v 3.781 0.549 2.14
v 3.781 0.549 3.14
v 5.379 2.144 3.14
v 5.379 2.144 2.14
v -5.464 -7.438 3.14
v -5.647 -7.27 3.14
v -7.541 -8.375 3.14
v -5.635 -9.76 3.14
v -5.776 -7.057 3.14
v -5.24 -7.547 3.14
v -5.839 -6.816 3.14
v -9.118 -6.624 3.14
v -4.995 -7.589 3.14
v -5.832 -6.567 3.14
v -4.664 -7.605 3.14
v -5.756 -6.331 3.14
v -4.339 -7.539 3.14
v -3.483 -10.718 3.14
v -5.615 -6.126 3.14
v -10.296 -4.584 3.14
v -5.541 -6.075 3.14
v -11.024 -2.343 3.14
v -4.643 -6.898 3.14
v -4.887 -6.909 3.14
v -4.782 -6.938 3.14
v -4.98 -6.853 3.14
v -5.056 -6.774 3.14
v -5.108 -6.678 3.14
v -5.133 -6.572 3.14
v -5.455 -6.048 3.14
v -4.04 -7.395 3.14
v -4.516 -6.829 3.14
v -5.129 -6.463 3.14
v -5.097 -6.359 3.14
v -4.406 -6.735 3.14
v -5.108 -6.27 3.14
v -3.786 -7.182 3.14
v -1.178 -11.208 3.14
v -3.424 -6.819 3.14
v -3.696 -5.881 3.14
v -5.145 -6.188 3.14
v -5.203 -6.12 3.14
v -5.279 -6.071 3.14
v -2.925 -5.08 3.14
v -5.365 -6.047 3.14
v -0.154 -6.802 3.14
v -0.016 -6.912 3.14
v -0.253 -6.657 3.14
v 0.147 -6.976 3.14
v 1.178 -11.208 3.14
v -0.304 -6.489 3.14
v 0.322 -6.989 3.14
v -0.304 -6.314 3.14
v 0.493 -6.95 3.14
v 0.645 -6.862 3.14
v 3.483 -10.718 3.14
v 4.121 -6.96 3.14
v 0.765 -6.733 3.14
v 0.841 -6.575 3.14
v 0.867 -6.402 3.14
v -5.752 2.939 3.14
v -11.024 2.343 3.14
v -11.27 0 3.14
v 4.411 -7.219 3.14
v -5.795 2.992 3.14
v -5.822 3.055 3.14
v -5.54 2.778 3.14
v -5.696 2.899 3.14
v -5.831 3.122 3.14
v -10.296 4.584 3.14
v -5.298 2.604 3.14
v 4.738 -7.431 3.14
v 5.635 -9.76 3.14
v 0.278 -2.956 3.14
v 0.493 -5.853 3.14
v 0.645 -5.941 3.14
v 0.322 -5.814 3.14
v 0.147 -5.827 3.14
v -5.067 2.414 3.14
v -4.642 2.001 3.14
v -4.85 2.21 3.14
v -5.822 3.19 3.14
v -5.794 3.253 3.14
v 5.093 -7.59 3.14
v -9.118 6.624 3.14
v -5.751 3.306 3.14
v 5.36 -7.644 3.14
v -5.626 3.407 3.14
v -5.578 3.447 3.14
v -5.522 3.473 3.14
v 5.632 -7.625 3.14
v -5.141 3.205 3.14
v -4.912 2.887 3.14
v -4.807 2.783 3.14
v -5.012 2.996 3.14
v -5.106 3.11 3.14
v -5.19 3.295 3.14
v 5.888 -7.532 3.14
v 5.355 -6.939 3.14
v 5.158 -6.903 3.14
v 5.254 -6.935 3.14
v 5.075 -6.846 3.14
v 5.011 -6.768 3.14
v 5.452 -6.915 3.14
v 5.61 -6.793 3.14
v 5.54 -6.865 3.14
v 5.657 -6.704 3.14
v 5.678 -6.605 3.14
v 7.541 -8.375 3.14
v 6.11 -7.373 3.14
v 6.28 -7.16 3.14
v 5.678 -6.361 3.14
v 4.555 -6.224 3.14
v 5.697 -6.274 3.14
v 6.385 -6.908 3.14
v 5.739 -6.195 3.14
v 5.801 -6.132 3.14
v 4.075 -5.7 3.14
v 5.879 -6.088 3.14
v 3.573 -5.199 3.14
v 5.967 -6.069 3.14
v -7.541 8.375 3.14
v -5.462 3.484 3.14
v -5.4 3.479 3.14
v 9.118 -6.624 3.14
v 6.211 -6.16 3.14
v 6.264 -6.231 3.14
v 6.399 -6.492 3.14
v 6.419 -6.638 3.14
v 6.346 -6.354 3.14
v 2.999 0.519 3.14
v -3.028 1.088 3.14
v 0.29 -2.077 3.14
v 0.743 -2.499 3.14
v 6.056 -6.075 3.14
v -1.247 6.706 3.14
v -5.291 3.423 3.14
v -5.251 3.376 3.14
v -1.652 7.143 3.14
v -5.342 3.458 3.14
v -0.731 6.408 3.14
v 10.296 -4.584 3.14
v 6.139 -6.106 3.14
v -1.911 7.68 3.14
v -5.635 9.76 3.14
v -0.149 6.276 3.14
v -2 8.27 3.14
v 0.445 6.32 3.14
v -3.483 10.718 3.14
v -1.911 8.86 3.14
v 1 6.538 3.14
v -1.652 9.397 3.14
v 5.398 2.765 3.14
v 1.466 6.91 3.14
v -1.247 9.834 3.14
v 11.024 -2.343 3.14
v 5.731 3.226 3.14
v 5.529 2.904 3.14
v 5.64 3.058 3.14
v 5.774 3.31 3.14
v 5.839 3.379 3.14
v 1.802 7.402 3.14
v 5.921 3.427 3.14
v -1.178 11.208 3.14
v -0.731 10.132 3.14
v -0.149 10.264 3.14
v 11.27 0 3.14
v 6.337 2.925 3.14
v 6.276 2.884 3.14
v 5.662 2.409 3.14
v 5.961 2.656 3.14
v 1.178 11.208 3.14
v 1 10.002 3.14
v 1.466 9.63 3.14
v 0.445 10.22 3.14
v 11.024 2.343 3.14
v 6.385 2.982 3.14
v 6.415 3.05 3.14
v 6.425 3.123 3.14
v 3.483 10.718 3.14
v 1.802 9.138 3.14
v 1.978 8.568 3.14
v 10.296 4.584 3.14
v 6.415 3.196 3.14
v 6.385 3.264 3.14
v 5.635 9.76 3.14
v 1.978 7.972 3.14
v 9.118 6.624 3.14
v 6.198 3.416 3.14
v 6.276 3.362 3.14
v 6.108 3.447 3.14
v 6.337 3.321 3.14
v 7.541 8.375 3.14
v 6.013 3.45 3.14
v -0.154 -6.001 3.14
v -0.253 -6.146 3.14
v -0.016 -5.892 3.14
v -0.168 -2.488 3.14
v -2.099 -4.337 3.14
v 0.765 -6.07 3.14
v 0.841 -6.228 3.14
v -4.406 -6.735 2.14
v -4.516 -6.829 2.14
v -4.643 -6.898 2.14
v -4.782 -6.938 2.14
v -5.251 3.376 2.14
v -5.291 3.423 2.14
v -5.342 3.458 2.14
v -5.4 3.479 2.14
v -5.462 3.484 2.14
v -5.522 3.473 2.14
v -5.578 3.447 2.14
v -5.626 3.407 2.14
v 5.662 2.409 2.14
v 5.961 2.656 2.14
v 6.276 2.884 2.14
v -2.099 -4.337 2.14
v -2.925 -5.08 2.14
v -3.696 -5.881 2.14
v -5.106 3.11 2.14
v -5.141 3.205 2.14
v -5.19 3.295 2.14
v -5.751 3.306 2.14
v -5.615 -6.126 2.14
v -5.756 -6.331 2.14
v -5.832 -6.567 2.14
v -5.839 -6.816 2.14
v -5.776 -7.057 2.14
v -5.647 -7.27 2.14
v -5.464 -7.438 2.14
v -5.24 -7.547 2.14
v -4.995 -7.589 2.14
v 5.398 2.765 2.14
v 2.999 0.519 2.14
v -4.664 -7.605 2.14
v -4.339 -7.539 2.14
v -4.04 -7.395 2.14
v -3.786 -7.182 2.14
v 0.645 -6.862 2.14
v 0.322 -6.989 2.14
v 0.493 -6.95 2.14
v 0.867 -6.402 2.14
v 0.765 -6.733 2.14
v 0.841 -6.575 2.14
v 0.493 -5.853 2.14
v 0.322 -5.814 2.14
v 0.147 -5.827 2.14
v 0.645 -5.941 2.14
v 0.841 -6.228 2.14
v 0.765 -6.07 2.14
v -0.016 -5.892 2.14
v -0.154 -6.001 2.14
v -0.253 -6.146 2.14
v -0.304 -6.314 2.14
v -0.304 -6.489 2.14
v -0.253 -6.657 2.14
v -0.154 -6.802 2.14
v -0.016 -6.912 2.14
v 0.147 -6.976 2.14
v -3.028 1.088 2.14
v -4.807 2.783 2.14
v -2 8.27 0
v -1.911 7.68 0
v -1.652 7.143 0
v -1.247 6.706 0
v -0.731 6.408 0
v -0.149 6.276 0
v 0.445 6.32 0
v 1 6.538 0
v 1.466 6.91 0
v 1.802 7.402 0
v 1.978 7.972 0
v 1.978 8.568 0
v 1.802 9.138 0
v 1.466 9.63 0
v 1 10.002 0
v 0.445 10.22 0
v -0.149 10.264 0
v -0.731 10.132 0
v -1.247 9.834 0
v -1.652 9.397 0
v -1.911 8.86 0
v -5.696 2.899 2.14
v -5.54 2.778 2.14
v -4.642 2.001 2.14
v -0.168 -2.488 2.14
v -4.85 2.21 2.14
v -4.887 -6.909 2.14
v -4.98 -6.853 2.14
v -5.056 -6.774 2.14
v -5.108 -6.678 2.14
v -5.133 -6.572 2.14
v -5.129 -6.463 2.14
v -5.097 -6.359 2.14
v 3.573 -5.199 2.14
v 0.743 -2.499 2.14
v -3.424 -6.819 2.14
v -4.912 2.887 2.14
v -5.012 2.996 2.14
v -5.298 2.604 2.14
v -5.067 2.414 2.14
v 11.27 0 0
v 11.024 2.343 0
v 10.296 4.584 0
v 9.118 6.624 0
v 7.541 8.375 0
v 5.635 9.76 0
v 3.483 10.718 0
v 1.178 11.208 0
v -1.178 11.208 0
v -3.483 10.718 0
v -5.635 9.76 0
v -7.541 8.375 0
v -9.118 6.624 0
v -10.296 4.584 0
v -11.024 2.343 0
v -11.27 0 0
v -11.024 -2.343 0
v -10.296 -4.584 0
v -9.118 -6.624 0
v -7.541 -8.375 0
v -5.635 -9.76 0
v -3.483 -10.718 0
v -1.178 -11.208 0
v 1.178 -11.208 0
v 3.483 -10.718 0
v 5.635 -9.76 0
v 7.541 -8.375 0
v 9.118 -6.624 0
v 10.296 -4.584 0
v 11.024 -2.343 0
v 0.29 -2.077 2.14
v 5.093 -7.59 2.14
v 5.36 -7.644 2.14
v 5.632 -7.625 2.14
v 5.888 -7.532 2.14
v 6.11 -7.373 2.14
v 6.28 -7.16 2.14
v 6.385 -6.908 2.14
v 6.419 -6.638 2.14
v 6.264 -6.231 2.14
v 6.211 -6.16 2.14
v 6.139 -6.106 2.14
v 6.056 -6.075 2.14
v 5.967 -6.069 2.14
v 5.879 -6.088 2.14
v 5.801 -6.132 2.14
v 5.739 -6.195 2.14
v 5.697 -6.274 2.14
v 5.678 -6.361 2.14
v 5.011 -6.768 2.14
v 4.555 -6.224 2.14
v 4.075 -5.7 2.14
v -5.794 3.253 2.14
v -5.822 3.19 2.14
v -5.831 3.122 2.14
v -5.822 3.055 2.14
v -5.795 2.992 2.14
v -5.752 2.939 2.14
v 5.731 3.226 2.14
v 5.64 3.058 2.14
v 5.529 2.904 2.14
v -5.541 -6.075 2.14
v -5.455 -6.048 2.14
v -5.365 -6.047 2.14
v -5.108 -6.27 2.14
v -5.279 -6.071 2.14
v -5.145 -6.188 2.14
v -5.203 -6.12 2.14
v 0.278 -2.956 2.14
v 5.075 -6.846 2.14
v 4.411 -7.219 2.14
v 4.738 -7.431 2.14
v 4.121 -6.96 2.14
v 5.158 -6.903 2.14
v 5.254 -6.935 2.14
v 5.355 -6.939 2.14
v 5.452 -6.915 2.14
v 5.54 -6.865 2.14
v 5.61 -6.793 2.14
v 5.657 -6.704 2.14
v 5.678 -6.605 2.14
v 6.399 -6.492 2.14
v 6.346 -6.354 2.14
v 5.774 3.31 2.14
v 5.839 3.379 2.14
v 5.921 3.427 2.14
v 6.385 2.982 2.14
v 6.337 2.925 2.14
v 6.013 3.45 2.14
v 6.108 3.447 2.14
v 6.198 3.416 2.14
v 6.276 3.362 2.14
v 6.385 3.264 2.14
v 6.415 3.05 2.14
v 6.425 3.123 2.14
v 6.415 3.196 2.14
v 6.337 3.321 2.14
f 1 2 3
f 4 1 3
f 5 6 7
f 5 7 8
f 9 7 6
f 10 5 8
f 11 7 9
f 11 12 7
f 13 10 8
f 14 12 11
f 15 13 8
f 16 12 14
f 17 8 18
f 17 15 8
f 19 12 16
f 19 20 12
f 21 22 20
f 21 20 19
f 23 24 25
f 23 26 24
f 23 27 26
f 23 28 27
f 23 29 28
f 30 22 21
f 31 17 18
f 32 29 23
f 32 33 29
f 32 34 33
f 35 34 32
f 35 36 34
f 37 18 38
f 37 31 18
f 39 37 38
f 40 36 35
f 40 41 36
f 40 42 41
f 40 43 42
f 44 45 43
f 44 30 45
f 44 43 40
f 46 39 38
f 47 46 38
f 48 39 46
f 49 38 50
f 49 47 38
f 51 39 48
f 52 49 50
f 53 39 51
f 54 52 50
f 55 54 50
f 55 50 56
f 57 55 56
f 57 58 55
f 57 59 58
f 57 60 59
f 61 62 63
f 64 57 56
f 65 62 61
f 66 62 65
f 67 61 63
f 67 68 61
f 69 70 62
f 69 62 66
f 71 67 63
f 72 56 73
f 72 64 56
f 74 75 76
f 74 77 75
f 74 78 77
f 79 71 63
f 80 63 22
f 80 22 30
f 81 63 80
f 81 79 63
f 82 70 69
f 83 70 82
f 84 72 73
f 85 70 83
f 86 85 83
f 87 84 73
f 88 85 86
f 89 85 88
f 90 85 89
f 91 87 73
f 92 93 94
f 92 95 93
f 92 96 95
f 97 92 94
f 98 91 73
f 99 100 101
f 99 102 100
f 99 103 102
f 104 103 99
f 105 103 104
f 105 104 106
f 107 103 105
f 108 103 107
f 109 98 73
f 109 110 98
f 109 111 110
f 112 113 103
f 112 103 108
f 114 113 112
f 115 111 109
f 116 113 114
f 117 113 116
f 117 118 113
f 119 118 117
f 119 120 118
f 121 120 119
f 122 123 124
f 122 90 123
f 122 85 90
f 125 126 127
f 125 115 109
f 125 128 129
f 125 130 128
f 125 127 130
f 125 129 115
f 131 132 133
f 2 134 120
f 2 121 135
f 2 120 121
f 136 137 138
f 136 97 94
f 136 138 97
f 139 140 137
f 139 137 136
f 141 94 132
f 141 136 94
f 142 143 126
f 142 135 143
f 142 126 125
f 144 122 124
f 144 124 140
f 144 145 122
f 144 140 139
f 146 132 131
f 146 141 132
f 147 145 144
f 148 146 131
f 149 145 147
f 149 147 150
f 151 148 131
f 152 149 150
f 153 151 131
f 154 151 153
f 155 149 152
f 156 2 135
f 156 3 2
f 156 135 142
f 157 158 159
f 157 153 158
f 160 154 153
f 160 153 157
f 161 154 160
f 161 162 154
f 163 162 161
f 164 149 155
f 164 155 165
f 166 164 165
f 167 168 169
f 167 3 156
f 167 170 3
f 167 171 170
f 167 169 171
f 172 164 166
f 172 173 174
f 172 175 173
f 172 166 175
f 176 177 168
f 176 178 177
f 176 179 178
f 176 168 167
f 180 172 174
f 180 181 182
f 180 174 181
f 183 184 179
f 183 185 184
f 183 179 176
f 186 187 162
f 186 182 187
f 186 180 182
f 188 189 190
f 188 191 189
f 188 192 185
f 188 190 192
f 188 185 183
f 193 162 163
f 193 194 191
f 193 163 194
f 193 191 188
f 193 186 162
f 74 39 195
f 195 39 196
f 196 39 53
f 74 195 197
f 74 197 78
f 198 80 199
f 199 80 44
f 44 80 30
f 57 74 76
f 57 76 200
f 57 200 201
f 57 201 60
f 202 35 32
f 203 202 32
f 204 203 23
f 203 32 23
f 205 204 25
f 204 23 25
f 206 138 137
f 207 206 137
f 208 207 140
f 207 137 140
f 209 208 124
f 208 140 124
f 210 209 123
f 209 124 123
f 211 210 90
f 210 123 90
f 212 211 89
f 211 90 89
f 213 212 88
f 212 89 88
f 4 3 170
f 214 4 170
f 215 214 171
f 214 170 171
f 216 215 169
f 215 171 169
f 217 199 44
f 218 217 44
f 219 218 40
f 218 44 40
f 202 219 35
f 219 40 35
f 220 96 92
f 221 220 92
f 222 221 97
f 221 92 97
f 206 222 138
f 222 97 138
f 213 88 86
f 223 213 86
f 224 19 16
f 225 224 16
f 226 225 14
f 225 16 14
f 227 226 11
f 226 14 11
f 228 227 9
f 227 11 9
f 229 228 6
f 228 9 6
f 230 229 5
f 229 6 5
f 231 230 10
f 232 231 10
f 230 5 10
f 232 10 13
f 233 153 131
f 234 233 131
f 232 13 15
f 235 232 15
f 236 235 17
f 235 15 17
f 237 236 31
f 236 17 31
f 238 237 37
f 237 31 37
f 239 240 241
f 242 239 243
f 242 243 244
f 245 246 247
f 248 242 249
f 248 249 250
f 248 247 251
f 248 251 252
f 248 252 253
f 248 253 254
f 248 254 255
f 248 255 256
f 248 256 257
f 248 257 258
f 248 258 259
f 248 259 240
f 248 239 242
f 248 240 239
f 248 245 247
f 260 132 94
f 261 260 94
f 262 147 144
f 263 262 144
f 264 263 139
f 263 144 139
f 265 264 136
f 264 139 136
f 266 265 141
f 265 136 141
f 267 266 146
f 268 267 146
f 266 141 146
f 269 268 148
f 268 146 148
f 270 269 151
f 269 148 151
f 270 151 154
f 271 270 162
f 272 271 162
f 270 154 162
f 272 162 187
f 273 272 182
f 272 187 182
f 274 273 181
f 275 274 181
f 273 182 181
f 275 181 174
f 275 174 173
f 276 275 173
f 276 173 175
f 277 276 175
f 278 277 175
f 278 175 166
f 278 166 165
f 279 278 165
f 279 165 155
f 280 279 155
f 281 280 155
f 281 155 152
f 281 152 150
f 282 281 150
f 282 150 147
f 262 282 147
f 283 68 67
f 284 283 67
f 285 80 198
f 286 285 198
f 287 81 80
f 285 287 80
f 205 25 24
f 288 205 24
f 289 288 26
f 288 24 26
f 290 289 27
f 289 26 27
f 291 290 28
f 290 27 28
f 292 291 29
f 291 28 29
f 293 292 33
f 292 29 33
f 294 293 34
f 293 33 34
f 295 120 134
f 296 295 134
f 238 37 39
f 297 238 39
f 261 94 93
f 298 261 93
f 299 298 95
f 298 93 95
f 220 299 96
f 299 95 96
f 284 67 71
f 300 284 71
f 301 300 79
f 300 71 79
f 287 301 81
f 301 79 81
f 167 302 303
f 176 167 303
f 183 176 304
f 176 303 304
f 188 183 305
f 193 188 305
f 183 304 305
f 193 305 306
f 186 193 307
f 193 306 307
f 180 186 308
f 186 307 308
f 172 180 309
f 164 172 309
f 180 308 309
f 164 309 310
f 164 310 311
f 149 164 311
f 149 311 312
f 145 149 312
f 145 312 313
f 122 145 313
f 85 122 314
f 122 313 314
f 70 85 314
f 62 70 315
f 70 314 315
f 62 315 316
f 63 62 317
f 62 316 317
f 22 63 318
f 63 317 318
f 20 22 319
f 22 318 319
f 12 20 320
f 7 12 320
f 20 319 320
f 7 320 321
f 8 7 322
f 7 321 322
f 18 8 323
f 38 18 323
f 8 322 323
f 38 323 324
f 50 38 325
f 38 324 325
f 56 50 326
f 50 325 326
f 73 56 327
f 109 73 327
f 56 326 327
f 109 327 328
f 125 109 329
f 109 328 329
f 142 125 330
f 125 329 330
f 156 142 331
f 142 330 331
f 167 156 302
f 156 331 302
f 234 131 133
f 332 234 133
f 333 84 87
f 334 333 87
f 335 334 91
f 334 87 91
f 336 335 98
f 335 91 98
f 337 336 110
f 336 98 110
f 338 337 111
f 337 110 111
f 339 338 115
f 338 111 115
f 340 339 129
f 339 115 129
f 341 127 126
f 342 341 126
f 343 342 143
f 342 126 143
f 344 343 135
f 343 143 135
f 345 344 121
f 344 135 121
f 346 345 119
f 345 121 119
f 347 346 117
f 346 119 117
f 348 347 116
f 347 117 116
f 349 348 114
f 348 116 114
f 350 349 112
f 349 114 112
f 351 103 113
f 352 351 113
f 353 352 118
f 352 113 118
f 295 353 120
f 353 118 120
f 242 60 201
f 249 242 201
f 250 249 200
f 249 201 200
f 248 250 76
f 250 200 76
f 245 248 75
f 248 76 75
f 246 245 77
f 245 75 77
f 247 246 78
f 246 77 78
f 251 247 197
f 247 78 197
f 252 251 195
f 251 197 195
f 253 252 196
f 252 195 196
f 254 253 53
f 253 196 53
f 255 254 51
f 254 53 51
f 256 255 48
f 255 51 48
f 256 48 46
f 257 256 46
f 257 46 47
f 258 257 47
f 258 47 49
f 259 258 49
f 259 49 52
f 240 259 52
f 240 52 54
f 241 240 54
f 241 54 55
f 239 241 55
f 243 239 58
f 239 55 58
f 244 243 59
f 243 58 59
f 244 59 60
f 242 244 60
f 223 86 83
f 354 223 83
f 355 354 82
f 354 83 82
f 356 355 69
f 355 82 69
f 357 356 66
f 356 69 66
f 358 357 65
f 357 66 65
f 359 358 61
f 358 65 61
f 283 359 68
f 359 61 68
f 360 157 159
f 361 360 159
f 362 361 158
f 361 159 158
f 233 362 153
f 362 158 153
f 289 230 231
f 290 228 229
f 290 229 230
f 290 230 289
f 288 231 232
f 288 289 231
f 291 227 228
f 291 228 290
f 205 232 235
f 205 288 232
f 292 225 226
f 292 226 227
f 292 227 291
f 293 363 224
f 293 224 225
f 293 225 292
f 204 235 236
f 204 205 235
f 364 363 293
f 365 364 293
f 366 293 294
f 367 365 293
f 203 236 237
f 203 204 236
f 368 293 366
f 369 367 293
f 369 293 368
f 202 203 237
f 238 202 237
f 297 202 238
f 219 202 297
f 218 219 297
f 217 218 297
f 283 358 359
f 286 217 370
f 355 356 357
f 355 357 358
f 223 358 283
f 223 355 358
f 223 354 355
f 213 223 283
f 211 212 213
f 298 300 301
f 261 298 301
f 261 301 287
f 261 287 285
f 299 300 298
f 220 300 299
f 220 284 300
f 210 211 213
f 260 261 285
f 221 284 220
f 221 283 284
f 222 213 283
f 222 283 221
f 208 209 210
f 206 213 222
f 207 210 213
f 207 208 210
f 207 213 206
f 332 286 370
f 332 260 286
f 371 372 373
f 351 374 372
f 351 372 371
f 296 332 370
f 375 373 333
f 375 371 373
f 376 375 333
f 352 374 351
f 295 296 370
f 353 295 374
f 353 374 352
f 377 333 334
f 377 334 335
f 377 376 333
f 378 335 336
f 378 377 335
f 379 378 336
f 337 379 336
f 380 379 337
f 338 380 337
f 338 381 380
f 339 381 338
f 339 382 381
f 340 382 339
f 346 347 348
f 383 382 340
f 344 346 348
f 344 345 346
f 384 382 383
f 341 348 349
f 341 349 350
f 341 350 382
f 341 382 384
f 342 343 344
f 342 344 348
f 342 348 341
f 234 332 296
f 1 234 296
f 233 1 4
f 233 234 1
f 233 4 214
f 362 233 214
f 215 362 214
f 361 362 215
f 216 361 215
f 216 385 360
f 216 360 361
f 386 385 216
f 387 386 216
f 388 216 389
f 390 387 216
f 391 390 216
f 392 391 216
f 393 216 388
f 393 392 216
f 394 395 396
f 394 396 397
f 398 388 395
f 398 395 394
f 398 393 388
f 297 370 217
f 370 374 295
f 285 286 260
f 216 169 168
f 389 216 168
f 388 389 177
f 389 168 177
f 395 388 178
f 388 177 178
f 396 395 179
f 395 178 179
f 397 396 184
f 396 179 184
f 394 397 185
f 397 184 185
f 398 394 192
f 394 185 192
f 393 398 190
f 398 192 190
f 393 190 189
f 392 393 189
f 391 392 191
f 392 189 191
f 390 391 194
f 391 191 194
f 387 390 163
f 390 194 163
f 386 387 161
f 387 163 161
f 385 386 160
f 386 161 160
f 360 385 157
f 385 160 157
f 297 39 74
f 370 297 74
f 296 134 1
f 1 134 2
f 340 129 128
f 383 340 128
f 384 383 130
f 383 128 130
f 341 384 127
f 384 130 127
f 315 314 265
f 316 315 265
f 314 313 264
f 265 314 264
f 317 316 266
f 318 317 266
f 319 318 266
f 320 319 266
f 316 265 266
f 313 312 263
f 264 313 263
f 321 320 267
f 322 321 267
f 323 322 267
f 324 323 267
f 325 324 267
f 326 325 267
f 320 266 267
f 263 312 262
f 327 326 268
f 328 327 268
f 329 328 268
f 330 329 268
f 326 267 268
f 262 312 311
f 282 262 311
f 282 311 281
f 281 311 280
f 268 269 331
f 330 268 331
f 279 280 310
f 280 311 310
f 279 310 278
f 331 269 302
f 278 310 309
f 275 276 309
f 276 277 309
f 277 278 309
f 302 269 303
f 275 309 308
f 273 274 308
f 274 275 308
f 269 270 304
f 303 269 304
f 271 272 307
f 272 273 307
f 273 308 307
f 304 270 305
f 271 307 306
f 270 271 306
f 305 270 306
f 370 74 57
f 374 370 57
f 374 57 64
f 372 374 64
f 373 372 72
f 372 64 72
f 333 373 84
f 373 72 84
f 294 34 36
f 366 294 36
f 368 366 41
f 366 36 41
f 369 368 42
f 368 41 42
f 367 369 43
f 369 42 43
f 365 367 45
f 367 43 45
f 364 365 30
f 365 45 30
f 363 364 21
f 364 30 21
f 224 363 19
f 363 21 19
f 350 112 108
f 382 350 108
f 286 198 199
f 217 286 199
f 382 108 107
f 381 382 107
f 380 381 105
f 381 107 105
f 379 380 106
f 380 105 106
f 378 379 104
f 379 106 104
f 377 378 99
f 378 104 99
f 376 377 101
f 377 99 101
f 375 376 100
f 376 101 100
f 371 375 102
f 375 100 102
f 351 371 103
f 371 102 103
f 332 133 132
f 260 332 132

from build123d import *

# Parameters (mm, degrees)
F0_R     = 11.27
F1_DEPTH = 3.14
F2_R     = 0.5890094212
F3_DEPTH = 1
F4_D     = 4


with BuildPart() as f1:
    # F0 (on Top) → F1 (new body)
    with BuildSketch(Plane.XY):
        Circle(F0_R)
    extrude(amount=F1_DEPTH)

    # F2 (on face) → F3 (cut)
    with BuildSketch(Plane.XY.offset(3.14)):
        with BuildLine():
            Line((-61.7312958373, 21.3926987009), (-58.0294454006, 25.2554991458))
            Line((-58.0294454006, 25.2554991458), (-54.1867637143, 21.2518673281))
            ThreePointArc((-54.1867637143, 21.2518673281), (-53.7373686171, 20.8806710534), (-53.2149149093, 20.6222435956))
            ThreePointArc((-53.2149149093, 20.6222435956), (-52.303276006, 20.7518245546), (-51.8888391992, 21.5740890181))
            ThreePointArc((-51.8888391992, 21.5740890181), (-51.9310478545, 21.7908044873), (-52.0434124717, 21.9808606841))
            ThreePointArc((-52.0434124717, 21.9808606841), (-52.3852964474, 22.1363147434), (-52.6291636905, 21.8506936919))
            Line((-52.6291636905, 21.8506936919), (-52.6291636905, 21.6066308894))
            ThreePointArc((-52.6291636905, 21.6066308894), (-52.9032514772, 21.281470401), (-53.2962690946, 21.4439222723))
            ThreePointArc((-53.2962690946, 21.4439222723), (-53.9894142385, 22.2523776329), (-54.7349330148, 23.012806469))
            Line((-54.7349330148, 23.012806469), (-57.5646452943, 25.7127153939))
            Line((-57.5646452943, 25.7127153939), (-54.5263338413, 28.7611883431))
            Line((-54.5263338413, 28.7611883431), (-52.9285208167, 30.355923602))
            ThreePointArc((-52.9285208167, 30.355923602), (-52.4977416389, 30.7470238341), (-52.0319618331, 31.0957060162))
            ThreePointArc((-52.0319618331, 31.0957060162), (-51.882280216, 31.3348975172), (-52.0319618331, 31.5740890181))
            ThreePointArc((-52.0319618331, 31.5740890181), (-52.3412808676, 31.6540069056), (-52.5764442328, 31.4377586097))
            ThreePointArc((-52.5764442328, 31.4377586097), (-52.720584525, 31.1912058371), (-52.9093169978, 30.9768585785))
            Line((-52.9093169978, 30.9768585785), (-55.3087755022, 28.7307036543))
            Line((-55.3087755022, 28.7307036543), (-58.0172568554, 26.1346496445))
            Line((-58.0172568554, 26.1346496445), (-61.3351414896, 29.3003376902))
            Line((-61.3351414896, 29.3003376902), (-63.1147513893, 30.9945066363))
            ThreePointArc((-63.1147513893, 30.9945066363), (-63.2699523014, 31.1530129011), (-63.4136438076, 31.3220226943))
            ThreePointArc((-63.4136438076, 31.3220226943), (-63.4713878606, 31.4628315528), (-63.5582546894, 31.5877942045))
            ThreePointArc((-63.5582546894, 31.5877942045), (-63.7382128733, 31.6951710938), (-63.9334617012, 31.6190617019))
            Line((-63.9334617012, 31.6190617019), (-64.0585307051, 31.5174429514))
            ThreePointArc((-64.0585307051, 31.5174429514), (-64.1366278816, 31.3000099116), (-64.0038129543, 31.1109689349))
            Line((-64.0038129543, 31.1109689349), (-63.8474769458, 30.9898083066))
            ThreePointArc((-63.8474769458, 30.9898083066), (-63.4886568855, 30.7229218485), (-63.1577918353, 30.4220754827))
            Line((-63.1577918353, 30.4220754827), (-62.9491744453, 30.2127408469))
            Line((-62.9491744453, 30.2127408469), (-58.4760000401, 25.7241872536))
            Line((-58.4760000401, 25.7241872536), (-60.4066995048, 23.874780467))
            ThreePointArc((-60.4066995048, 23.874780467), (-61.6253233945, 22.738509753), (-62.7133773323, 21.4766484497))
            ThreePointArc((-62.7133773323, 21.4766484497), (-62.8851672484, 21.3450641448), (-63.089355572, 21.2734168623))
            ThreePointArc((-63.089355572, 21.2734168623), (-63.3925338367, 21.4837956535), (-63.404364434, 21.8526266894))
            ThreePointArc((-63.404364434, 21.8526266894), (-63.5864183589, 22.1403709739), (-63.9226048834, 22.0863429656))
            ThreePointArc((-63.9226048834, 22.0863429656), (-64.0836440025, 21.1552024698), (-63.3027486402, 20.6230759303))
            ThreePointArc((-63.3027486402, 20.6230759303), (-62.6464252626, 20.6724715017), (-62.0935210892, 21.0295391052))
            Line((-62.0935210892, 21.0295391052), (-61.7312958373, 21.3926987009))
        make_face()
        with BuildLine():
            Line((-3.4236896342, -6.8191600484), (0.2781608025, -2.9563596035))
            Line((0.2781608025, -2.9563596035), (4.1208424888, -6.9599914212))
            ThreePointArc((4.1208424888, -6.9599914212), (4.570237586, -7.3311876959), (5.0926912938, -7.5896151537))
            ThreePointArc((5.0926912938, -7.5896151537), (6.004330197, -7.4600341947), (6.4187670038, -6.6377697312))
            ThreePointArc((6.4187670038, -6.6377697312), (6.3765583485, -6.421054262), (6.2641937313, -6.2309980652))
            ThreePointArc((6.2641937313, -6.2309980652), (5.9223097557, -6.0755440059), (5.6784425126, -6.3611650574))
            Line((5.6784425126, -6.3611650574), (5.6784425126, -6.6052278599))
            ThreePointArc((5.6784425126, -6.6052278599), (5.4043547258, -6.9303883483), (5.0113371085, -6.767936477))
            ThreePointArc((5.0113371085, -6.767936477), (4.3181919645, -5.9594811164), (3.5726731882, -5.1990522803))
            Line((3.5726731882, -5.1990522803), (0.7429609088, -2.4991433554))
            Line((0.7429609088, -2.4991433554), (3.7812723618, 0.5493295938))
            Line((3.7812723618, 0.5493295938), (5.3790853864, 2.1440648527))
            ThreePointArc((5.3790853864, 2.1440648527), (5.8098645642, 2.5351650848), (6.2756443699, 2.8838472669))
            ThreePointArc((6.2756443699, 2.8838472669), (6.4253259871, 3.1230387679), (6.2756443699, 3.3622302688))
            ThreePointArc((6.2756443699, 3.3622302688), (5.9663253355, 3.4421481563), (5.7311619703, 3.2258998604))
            ThreePointArc((5.7311619703, 3.2258998604), (5.587021678, 2.9793470878), (5.3982892053, 2.7649998292))
            Line((5.3982892053, 2.7649998292), (2.9988307009, 0.518844905))
            Line((2.9988307009, 0.518844905), (0.2903493477, -2.0772091048))
            Line((0.2903493477, -2.0772091048), (-3.0275352865, 1.0884789409))
            Line((-3.0275352865, 1.0884789409), (-4.8071451862, 2.782647887))
            ThreePointArc((-4.8071451862, 2.782647887), (-4.9623460984, 2.9411541518), (-5.1060376045, 3.110163945))
            ThreePointArc((-5.1060376045, 3.110163945), (-5.1637816575, 3.2509728035), (-5.2506484863, 3.3759354552))
            ThreePointArc((-5.2506484863, 3.3759354552), (-5.4306066702, 3.4833123445), (-5.6258554981, 3.4072029526))
            Line((-5.6258554981, 3.4072029526), (-5.7509245021, 3.3055842021))
            ThreePointArc((-5.7509245021, 3.3055842021), (-5.8290216786, 3.0881511623), (-5.6962067512, 2.8991101857))
            Line((-5.6962067512, 2.8991101857), (-5.5398707427, 2.7779495573))
            ThreePointArc((-5.5398707427, 2.7779495573), (-5.1810506824, 2.5110630992), (-4.8501856322, 2.2102167334))
            Line((-4.8501856322, 2.2102167334), (-4.6415682422, 2.0008820976))
            Line((-4.6415682422, 2.0008820976), (-0.168393837, -2.4876714957))
            Line((-0.168393837, -2.4876714957), (-2.0990933017, -4.3370782823))
            ThreePointArc((-2.0990933017, -4.3370782823), (-3.3177171915, -5.4733489963), (-4.4057711293, -6.7352102996))
            ThreePointArc((-4.4057711293, -6.7352102996), (-4.5775610453, -6.8667946045), (-4.7817493689, -6.938441887))
            ThreePointArc((-4.7817493689, -6.938441887), (-5.0849276337, -6.7280630958), (-5.0967582309, -6.3592320599))
            ThreePointArc((-5.0967582309, -6.3592320599), (-5.2788121559, -6.0714877754), (-5.6149986803, -6.1255157836))
            ThreePointArc((-5.6149986803, -6.1255157836), (-5.7760377995, -7.0566562795), (-4.9951424372, -7.588782819))
            ThreePointArc((-4.9951424372, -7.588782819), (-4.3388190596, -7.5393872476), (-3.7859148861, -7.1823196441))
            Line((-3.7859148861, -7.1823196441), (-3.4236896342, -6.8191600484))
        make_face()
        with Locations((0.2781608025, -6.4016040415)):
            Circle(F2_R)
    extrude(amount=-F3_DEPTH, mode=Mode.SUBTRACT)

    # F4 (through all)
    with Locations(Plane(origin=(0, 0, 0), x_dir=(1, 0, 0), z_dir=(0, 0, -1))):
        with Locations((0, -8.27)):
            Hole(F4_D / 2)


solid = f1.part
